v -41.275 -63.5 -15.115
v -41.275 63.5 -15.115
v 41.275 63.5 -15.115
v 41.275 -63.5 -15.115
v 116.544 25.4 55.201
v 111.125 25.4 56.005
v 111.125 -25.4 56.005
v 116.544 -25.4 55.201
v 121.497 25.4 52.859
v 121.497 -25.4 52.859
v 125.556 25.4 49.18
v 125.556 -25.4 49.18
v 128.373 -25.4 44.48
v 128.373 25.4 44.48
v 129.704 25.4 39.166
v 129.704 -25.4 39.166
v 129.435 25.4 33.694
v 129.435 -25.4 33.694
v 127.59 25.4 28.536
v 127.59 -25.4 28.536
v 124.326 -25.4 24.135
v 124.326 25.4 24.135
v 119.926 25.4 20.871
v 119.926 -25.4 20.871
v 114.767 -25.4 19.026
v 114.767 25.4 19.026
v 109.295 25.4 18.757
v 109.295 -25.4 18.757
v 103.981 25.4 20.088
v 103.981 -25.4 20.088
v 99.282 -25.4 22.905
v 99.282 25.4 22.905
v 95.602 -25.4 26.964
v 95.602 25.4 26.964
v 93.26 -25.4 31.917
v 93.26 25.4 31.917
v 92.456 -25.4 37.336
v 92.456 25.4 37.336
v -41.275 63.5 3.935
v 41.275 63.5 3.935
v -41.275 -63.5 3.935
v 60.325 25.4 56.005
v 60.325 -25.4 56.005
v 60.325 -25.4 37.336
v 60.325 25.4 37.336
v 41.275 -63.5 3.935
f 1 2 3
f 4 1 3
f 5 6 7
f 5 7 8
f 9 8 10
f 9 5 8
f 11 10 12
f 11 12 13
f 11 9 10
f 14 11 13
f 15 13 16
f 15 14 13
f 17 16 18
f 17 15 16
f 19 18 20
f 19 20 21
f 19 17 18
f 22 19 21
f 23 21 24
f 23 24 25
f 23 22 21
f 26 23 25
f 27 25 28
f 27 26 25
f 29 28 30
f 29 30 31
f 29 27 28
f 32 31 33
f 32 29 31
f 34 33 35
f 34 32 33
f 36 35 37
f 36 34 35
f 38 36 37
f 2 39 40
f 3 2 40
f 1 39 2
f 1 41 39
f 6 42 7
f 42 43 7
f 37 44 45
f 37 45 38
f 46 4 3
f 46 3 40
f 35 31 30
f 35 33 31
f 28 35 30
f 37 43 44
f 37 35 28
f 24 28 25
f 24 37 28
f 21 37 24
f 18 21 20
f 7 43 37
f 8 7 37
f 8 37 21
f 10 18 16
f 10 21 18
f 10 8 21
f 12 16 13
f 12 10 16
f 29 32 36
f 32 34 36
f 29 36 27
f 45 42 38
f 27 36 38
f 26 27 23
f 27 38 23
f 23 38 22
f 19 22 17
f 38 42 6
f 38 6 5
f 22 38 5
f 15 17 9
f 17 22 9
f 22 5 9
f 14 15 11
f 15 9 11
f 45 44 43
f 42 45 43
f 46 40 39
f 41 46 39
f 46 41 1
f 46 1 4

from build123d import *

# Parameters (mm, degrees)
F1_DEPTH  = 63.5
F0_W      = 50.8
F0_H      = 18.669
F2_DEPTH  = 25.4
F2_FACE_W = 50.8
F2_FACE_H = 18.669


with BuildPart() as f1:
    # F0 (on Front) → F1 (new body, symmetric)
    with BuildSketch(Plane.XZ):
        Polygon((22.225, 3.9350592289), (-41.275, 3.9350592289), (-41.275, -15.1149407711), (41.275, -15.1149407711), (41.275, 3.9350592289), align=None)
    extrude(amount=F1_DEPTH, both=True)


with BuildPart() as f2:
    # F0 (on Front) → F2 (new body, symmetric)
    with BuildSketch(Plane.XZ):
        with Locations((85.725, 46.6705592289)):
            Rectangle(F0_W, F0_H)
    extrude(amount=F2_DEPTH, both=True)

    # F2_face (on face) → F3 (revolve)
    with BuildSketch(Plane(origin=(111.125, 0, 46.6705592289), x_dir=(0, 1, 0), z_dir=(1, 0, 0))):
        Rectangle(F2_FACE_W, F2_FACE_H)
    revolve(axis=Axis((111.125, 0, 37.3360592289), (0, 1, 0)))


solid = Compound([f1.part, f2.part])
